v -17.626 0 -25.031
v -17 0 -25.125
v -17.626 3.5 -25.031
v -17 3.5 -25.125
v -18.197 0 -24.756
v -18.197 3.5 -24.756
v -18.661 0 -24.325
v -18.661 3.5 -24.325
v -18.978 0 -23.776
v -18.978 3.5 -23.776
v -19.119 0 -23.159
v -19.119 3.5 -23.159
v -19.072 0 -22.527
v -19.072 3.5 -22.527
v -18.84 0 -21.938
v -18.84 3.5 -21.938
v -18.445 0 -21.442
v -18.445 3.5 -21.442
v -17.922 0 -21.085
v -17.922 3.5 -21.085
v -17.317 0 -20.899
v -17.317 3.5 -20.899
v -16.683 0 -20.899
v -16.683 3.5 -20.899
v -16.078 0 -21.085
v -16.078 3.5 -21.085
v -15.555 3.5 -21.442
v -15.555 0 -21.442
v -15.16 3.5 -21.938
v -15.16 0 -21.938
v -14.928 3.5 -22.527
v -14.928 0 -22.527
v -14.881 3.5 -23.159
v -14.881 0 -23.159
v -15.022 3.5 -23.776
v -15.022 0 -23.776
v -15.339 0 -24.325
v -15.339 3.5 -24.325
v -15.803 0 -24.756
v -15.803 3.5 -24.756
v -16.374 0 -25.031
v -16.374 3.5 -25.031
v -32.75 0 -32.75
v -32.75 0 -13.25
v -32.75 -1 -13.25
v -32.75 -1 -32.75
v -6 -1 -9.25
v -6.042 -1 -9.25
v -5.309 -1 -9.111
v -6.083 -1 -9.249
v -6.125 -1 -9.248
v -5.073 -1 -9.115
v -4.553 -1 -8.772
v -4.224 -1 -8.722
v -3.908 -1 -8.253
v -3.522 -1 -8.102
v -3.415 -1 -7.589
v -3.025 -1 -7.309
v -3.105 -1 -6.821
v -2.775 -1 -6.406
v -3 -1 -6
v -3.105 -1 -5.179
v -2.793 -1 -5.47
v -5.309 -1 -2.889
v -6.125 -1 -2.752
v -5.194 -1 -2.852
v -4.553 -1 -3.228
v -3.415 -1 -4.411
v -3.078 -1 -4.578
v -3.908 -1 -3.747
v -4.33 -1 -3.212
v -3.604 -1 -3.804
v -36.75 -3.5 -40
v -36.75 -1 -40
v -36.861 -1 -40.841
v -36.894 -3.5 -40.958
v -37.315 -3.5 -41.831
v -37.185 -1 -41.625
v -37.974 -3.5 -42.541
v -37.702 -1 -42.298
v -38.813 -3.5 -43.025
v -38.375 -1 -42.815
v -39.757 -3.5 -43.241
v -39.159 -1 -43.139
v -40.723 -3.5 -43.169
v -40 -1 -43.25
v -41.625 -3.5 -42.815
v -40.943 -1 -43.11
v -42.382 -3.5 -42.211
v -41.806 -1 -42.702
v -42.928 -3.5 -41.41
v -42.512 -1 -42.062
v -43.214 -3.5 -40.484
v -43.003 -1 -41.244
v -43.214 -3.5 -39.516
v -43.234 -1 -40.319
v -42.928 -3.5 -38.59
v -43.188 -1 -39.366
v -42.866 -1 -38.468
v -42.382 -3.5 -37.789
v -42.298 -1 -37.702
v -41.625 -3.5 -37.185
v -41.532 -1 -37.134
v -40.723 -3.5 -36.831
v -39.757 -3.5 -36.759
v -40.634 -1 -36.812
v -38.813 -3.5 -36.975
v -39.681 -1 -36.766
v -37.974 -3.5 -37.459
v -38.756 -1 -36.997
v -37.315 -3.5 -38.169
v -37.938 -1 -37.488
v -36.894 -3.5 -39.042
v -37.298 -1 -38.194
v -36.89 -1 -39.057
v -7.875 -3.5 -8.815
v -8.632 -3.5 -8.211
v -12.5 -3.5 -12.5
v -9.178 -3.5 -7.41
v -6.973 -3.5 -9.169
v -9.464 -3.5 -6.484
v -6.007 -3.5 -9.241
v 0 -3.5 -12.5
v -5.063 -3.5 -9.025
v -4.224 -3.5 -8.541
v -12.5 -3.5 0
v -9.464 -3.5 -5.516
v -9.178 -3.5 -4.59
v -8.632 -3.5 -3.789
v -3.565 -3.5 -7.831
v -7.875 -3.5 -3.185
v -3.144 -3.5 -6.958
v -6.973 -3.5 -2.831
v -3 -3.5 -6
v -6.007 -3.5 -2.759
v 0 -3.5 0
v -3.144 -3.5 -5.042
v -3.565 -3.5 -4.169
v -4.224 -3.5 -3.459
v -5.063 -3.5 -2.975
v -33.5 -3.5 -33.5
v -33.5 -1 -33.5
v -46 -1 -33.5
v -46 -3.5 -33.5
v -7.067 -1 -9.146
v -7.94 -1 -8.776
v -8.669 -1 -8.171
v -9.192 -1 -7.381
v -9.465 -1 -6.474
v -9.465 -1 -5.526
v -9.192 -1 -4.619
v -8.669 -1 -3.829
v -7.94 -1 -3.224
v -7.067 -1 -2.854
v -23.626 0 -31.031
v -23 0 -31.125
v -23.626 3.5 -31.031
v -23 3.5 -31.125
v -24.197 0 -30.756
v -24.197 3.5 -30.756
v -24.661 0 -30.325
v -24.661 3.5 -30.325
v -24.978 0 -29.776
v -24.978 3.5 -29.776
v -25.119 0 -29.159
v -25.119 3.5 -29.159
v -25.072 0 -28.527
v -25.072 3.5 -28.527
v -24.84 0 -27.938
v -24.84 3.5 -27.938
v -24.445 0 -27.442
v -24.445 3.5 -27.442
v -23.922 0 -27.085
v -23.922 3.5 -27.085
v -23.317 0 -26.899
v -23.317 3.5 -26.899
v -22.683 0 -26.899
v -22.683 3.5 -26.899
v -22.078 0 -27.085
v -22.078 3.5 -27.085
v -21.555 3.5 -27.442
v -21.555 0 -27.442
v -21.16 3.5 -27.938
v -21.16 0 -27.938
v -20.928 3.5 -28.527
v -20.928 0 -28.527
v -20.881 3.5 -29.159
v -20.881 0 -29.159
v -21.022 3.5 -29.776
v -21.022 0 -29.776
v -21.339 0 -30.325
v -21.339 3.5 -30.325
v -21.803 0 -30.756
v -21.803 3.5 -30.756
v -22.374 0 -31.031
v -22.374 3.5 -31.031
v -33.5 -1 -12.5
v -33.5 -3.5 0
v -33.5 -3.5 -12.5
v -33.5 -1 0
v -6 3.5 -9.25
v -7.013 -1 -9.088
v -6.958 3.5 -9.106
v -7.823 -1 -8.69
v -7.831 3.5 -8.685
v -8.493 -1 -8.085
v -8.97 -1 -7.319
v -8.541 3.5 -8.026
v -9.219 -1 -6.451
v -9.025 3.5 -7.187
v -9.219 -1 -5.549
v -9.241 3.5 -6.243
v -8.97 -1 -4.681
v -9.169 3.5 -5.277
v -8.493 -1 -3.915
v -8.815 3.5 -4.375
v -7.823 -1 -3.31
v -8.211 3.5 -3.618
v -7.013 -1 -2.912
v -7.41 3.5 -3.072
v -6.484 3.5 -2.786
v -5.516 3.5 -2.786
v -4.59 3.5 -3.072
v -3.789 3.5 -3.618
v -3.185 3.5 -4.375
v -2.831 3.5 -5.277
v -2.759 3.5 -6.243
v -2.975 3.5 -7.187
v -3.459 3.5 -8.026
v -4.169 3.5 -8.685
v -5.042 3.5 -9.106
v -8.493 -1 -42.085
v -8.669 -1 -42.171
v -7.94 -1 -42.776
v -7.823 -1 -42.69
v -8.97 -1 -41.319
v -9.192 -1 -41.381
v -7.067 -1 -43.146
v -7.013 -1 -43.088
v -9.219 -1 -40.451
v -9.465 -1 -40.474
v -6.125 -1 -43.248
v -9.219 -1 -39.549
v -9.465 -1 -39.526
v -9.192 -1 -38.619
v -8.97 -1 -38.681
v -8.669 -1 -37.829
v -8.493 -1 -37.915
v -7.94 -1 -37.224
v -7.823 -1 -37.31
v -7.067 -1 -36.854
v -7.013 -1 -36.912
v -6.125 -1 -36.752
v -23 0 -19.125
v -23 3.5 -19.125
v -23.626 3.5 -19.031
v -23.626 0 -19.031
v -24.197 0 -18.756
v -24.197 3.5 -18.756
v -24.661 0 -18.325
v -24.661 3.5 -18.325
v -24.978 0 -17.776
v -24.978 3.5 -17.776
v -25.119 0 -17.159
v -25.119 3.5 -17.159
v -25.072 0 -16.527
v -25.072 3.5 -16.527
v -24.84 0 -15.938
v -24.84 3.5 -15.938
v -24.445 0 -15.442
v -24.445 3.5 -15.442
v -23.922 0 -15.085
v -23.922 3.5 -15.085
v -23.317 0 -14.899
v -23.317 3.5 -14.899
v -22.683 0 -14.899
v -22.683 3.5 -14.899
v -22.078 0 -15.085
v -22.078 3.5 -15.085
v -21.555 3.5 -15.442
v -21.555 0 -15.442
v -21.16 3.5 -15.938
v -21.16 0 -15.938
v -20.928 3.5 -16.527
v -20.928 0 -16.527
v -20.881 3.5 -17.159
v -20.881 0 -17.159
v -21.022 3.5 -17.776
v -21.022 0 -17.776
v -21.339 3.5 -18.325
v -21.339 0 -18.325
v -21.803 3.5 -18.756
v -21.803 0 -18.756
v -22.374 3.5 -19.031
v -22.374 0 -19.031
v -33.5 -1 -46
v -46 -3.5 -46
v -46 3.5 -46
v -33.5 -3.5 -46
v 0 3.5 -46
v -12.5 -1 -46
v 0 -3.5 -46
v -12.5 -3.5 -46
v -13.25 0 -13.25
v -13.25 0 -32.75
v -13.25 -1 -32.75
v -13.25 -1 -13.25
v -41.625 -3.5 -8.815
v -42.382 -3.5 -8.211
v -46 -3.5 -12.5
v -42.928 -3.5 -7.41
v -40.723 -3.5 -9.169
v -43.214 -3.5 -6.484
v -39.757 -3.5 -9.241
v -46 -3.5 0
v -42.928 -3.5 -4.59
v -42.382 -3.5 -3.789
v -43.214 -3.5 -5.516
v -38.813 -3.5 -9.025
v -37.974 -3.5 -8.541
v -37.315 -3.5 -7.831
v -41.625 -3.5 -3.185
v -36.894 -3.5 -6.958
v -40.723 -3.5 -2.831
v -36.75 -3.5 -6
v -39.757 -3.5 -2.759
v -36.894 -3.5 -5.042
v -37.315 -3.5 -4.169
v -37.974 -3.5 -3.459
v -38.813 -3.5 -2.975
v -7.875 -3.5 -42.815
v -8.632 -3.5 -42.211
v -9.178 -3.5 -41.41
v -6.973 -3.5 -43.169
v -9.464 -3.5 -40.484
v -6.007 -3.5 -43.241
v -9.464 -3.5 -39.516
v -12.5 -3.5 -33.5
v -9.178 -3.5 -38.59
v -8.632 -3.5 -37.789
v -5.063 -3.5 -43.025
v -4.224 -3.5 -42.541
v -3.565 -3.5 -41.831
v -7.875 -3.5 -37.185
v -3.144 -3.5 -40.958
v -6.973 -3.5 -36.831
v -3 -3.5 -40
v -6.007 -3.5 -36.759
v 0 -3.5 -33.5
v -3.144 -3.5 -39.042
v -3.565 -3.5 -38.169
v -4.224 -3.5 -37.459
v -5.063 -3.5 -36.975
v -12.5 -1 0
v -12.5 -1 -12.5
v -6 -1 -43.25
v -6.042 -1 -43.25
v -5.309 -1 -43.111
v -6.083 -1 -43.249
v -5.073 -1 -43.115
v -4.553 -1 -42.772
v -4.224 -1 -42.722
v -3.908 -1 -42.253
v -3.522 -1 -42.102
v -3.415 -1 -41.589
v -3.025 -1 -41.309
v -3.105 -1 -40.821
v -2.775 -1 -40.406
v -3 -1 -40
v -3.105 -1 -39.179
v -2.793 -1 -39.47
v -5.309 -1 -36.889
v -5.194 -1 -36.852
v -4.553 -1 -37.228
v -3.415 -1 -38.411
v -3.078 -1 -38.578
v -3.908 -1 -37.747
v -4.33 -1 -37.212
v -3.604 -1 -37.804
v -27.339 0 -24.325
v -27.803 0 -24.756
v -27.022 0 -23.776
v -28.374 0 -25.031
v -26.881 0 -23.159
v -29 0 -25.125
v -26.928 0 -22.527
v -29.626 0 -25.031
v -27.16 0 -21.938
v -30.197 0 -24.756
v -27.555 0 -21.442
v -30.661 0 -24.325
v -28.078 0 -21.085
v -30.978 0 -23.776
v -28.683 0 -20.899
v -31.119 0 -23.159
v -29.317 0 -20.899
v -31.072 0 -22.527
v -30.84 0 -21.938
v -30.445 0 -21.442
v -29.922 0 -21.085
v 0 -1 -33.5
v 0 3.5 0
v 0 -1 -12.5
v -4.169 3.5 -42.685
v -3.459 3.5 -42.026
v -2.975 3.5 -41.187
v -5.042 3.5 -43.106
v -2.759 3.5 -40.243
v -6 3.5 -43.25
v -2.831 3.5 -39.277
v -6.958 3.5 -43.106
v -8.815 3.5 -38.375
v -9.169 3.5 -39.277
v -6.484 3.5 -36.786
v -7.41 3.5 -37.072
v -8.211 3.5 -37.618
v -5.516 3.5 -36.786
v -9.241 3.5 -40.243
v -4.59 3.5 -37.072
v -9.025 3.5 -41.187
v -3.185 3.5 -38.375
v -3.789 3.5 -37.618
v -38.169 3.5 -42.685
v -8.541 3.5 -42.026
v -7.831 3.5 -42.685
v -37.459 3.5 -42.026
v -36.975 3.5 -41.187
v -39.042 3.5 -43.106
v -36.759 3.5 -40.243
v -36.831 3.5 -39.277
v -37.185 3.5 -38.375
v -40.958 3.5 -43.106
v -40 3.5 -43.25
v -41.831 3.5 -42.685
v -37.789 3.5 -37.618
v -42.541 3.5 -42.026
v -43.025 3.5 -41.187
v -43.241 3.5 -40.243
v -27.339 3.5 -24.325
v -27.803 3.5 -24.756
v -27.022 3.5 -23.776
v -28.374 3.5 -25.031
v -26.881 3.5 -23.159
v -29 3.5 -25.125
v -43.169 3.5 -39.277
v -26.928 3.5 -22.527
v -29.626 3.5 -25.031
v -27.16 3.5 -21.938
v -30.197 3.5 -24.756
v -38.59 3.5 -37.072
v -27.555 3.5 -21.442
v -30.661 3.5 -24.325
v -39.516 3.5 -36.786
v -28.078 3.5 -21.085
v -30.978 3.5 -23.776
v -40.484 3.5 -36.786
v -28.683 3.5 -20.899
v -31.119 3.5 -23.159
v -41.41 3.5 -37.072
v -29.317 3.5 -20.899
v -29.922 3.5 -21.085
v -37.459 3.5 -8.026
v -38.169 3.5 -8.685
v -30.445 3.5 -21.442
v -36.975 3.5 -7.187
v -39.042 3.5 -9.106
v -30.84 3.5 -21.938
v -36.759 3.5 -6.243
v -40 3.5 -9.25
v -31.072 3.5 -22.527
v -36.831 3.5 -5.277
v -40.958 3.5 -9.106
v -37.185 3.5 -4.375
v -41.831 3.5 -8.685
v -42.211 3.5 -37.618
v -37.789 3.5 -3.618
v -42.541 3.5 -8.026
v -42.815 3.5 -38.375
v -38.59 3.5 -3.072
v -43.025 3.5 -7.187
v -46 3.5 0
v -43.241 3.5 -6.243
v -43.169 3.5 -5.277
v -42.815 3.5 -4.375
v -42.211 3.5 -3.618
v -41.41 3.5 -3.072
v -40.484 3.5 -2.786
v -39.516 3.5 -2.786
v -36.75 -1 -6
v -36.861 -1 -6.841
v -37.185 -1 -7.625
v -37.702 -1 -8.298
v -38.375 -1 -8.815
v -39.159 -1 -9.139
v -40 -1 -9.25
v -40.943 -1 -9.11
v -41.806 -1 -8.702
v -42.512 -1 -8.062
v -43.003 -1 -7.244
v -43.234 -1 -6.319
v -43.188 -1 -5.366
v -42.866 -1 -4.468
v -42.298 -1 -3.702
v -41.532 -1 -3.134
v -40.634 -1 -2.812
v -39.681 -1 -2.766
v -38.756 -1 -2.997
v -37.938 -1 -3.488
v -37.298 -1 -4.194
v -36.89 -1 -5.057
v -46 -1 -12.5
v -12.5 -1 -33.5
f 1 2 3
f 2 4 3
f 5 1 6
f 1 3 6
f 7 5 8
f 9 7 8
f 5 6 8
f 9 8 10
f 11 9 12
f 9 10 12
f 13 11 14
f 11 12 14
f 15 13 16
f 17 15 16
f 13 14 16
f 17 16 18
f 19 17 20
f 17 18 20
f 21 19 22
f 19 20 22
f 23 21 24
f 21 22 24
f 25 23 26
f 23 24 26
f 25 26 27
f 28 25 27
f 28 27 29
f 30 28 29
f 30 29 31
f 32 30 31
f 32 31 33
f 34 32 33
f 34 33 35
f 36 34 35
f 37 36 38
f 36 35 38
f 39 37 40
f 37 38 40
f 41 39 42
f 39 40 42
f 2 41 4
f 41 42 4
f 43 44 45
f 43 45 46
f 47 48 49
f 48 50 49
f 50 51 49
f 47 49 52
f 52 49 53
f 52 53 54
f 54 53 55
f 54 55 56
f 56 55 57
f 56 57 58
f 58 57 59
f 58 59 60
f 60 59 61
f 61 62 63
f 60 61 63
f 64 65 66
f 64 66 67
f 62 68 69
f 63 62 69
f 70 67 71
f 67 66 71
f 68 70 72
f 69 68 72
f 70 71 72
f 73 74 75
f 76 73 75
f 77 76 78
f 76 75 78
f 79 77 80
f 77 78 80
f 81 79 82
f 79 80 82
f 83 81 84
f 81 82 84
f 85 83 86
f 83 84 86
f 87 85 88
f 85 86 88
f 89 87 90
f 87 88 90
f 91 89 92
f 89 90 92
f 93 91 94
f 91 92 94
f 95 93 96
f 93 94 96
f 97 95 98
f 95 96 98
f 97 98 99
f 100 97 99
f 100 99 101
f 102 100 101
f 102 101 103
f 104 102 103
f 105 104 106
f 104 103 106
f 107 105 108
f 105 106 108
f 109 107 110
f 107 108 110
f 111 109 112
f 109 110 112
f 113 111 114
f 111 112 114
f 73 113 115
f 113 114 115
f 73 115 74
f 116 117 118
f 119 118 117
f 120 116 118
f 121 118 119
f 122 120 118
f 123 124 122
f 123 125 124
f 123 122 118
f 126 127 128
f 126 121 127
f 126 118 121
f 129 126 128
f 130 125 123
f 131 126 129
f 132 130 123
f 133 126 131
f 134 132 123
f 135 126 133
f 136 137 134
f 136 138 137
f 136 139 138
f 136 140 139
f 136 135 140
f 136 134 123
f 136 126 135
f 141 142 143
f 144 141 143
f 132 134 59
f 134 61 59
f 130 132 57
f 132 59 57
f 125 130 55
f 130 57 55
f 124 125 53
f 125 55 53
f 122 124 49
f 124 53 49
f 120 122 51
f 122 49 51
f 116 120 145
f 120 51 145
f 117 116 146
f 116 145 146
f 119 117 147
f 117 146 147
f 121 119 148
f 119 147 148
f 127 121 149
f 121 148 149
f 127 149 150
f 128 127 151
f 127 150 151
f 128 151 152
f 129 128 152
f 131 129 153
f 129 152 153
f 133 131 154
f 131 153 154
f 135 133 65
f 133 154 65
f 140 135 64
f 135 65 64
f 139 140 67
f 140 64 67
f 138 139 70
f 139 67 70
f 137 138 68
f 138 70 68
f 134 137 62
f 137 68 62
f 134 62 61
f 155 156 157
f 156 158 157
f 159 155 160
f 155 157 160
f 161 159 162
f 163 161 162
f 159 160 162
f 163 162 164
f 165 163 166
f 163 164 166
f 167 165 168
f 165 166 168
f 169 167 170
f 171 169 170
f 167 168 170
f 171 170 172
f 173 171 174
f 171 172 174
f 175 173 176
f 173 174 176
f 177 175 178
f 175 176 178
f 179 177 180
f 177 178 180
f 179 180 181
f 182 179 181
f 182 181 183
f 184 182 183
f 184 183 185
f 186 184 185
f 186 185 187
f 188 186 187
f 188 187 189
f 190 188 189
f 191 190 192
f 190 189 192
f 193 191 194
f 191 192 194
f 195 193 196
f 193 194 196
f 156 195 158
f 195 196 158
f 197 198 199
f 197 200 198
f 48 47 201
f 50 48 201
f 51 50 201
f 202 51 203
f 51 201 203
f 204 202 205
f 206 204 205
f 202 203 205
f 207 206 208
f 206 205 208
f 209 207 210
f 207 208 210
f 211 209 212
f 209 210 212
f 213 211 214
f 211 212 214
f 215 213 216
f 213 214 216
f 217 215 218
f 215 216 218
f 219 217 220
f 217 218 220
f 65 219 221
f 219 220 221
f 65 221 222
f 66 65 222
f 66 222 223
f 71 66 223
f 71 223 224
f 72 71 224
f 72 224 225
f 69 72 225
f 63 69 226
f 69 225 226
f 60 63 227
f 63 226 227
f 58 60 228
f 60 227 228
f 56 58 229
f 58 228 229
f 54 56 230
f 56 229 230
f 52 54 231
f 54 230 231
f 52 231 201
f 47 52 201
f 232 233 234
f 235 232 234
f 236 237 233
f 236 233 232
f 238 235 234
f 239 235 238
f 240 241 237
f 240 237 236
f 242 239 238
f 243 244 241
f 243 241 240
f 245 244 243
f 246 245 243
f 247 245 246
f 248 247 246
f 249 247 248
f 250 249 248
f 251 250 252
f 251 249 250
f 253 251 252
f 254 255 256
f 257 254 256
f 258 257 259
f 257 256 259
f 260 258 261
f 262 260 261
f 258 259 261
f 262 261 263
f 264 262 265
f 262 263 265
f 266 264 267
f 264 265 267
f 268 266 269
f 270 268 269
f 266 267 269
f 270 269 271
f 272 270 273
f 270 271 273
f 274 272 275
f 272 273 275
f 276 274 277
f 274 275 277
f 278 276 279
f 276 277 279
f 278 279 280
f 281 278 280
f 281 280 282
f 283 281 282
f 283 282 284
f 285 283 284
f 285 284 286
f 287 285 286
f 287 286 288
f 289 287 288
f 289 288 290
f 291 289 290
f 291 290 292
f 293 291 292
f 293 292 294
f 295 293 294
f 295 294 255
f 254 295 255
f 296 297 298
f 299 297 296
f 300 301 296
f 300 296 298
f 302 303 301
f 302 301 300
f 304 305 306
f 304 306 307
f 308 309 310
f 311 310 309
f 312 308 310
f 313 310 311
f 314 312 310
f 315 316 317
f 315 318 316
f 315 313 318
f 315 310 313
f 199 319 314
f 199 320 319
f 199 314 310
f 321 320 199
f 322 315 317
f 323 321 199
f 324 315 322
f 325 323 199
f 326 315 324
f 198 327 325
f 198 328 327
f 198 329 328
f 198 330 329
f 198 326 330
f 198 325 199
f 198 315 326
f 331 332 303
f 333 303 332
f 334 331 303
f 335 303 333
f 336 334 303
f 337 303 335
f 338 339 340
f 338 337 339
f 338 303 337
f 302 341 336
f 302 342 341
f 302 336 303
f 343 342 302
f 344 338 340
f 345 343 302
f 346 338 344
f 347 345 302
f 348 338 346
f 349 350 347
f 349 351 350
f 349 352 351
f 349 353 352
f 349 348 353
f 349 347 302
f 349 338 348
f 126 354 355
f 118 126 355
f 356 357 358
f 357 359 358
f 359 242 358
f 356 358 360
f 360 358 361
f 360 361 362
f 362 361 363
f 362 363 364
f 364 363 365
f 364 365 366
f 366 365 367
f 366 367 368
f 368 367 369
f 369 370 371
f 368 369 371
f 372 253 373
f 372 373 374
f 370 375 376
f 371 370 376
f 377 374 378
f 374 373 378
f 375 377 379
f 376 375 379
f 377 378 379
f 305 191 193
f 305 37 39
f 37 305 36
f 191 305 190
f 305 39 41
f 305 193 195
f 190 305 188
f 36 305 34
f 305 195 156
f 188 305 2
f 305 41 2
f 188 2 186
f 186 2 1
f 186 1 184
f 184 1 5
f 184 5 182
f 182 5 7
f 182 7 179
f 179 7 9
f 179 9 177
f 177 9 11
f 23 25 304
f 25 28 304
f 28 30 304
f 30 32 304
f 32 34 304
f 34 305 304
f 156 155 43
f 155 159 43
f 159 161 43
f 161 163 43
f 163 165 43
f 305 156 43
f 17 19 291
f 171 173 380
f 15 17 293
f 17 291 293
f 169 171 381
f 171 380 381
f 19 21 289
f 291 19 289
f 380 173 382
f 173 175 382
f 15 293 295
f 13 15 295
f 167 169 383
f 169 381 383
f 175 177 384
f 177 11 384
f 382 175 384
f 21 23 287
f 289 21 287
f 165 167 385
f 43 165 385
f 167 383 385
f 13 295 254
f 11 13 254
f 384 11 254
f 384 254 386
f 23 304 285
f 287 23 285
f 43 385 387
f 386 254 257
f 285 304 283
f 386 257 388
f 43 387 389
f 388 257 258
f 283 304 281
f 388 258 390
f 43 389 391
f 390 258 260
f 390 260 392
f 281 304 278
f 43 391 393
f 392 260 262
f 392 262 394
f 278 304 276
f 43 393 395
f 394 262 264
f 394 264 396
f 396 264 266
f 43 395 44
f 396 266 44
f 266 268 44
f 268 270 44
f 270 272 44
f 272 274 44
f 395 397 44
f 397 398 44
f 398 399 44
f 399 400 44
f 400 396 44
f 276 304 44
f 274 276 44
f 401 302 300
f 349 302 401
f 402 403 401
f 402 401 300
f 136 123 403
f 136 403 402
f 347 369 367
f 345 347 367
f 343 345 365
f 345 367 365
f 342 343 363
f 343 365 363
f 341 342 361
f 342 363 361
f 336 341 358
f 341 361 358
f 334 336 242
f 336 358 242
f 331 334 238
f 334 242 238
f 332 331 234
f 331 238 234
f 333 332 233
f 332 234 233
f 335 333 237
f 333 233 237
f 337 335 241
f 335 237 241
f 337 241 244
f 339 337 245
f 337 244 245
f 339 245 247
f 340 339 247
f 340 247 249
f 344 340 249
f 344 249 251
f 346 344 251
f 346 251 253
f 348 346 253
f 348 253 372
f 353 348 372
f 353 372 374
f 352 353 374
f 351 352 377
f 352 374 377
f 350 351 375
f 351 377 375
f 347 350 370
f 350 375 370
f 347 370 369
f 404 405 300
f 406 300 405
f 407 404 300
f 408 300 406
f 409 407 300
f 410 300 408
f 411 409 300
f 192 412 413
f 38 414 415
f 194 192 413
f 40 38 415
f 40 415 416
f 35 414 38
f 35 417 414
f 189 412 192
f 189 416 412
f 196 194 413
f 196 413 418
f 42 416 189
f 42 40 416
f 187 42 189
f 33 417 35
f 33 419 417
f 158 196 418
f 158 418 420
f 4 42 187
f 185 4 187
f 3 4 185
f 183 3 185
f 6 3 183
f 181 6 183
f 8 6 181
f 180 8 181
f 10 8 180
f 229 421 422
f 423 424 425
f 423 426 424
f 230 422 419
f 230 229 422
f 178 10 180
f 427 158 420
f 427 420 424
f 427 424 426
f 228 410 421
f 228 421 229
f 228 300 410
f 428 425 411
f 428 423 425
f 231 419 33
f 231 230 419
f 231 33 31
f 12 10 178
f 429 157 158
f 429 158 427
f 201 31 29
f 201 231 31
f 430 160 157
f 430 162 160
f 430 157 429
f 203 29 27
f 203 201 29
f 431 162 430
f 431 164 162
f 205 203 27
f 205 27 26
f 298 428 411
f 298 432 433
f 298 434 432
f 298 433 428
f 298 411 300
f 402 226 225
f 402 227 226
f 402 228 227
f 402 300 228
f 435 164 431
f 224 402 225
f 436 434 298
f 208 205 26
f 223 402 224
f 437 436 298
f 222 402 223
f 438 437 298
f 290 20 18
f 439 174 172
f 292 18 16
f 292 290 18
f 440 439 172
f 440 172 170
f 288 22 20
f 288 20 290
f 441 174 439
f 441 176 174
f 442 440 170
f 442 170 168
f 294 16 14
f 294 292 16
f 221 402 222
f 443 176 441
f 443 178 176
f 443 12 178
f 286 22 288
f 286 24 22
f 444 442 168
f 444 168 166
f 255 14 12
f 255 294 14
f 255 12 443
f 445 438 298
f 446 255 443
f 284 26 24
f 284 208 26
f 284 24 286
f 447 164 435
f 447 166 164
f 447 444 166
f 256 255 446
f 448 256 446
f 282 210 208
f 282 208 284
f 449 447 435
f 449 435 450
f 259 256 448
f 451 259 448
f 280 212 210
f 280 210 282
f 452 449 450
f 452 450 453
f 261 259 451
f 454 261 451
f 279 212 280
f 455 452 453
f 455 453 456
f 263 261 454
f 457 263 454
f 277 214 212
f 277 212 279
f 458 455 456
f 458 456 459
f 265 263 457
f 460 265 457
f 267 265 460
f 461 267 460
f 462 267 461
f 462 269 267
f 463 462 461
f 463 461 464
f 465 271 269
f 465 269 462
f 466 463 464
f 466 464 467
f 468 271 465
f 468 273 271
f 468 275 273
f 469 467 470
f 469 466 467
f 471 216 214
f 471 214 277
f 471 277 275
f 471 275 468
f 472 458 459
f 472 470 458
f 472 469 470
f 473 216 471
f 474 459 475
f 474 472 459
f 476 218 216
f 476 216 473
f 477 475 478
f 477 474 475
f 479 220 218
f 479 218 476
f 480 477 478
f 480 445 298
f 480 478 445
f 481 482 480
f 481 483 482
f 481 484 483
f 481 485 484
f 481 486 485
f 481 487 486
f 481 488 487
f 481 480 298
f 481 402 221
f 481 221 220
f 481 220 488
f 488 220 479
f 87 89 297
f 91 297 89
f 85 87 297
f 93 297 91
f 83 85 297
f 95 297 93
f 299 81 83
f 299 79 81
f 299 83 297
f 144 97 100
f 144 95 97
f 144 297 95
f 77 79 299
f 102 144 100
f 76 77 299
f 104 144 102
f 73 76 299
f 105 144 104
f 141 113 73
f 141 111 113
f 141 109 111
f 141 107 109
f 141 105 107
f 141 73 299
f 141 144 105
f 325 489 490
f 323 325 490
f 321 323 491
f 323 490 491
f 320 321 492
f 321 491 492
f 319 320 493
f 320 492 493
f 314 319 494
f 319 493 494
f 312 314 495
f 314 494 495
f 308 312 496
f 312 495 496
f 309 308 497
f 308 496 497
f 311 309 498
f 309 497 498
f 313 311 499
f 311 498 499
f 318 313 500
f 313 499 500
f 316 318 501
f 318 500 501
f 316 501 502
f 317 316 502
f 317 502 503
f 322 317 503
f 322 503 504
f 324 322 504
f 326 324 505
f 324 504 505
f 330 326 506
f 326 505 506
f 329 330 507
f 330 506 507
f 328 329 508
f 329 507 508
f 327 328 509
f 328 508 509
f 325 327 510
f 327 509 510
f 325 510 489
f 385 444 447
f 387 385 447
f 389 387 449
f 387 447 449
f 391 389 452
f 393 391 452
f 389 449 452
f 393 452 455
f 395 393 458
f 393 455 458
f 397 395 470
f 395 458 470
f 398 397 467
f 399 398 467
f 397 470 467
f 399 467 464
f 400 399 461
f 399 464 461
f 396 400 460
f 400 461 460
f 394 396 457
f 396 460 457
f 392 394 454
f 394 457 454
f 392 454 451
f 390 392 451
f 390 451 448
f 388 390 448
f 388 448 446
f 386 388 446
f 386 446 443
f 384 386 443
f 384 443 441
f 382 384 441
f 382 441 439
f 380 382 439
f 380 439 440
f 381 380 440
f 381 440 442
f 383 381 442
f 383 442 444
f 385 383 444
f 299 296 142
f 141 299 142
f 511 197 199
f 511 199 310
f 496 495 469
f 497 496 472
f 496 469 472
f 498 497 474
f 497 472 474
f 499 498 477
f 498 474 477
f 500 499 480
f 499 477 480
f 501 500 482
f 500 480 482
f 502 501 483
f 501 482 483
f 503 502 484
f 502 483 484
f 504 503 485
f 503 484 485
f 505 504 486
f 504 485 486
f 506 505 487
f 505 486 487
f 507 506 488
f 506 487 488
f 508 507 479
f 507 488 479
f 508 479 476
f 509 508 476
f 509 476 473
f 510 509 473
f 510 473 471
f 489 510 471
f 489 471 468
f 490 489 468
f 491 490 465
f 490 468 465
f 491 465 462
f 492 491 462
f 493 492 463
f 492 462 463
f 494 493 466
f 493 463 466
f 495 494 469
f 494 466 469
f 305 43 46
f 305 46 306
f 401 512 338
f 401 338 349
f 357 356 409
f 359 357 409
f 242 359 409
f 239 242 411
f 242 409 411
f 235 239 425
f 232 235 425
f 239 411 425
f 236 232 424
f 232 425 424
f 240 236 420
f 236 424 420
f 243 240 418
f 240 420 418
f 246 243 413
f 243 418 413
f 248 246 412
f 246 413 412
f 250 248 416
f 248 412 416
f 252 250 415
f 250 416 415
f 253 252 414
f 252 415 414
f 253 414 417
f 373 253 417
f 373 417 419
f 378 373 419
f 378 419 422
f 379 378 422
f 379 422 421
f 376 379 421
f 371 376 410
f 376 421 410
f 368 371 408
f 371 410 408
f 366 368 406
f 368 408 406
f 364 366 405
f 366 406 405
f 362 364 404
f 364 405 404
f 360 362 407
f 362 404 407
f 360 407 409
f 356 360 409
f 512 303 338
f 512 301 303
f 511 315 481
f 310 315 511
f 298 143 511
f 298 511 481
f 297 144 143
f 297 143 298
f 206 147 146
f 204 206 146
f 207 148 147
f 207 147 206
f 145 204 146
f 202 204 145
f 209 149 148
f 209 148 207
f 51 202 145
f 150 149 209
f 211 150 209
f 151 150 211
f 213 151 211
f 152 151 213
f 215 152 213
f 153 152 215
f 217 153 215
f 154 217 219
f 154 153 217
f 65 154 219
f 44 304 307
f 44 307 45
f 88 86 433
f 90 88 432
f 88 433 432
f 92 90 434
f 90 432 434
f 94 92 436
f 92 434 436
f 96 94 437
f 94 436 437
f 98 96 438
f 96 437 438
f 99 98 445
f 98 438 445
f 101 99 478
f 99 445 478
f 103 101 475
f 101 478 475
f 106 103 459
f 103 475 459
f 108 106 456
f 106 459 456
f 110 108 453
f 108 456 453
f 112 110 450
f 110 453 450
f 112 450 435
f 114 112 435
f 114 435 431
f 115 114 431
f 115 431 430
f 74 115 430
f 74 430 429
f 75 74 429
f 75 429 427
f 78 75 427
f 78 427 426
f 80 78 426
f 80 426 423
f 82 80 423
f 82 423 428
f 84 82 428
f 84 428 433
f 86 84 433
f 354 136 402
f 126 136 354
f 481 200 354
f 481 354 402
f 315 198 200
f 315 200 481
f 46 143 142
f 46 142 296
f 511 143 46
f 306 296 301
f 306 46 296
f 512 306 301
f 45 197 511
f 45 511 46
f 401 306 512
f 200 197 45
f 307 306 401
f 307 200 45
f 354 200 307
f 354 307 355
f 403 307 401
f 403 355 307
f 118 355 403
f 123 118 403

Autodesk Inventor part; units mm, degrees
ref_plane "YZ Plane" through (0, 0, 0) normal (1, 0, 0) x (0, 1, 0)
ref_plane "XZ Plane" through (0, 0, 0) normal (0, 1, 0) x (-1, 0, 0)
ref_plane "XY Plane" through (0, 0, 0) normal (0, 0, 1) x (1, 0, 0)
sketch "Sketch2" plane through (0, 0, 0) normal (0, 1, 0) x (-1, 0, 0)
  line L0 (0, 0) -> (46, 0)
  line L1 (46, 0) -> (46, -46)
  line L2 (46, -46) -> (0, -46)
  line L3 (0, -46) -> (0, 0)
  dimension "d0" = 46
  dimension "d1" = 46
extrude "Extrusion1" add sketch "Sketch2" along normal blind 3.5
sketch "Sketch6" plane through (0, 0, 0) normal (0, -1, 0) x (1, 0, 0)
  line L0 (-13.25, -13.25) -> (-32.75, -13.25)
  line L1 (-32.75, -13.25) -> (-32.75, -32.75)
  line L2 (-32.75, -32.75) -> (-13.25, -32.75)
  line L3 (-13.25, -32.75) -> (-13.25, -13.25)
  line L4 (-46, -46) -> (0, -46) projected
  line L5 (0, 0) -> (0, -46) projected
  line L6 (-46, -46) -> (-46, 0) projected
  line L7 (0, 0) -> (-46, 0)
  line L8 (-46, 0) -> (-46, -46)
  line L9 (-46, -46) -> (0, -46)
  line L10 (0, -46) -> (0, 0)
  dimension "d41" = 13.25
  dimension "d42" = 13.25
  dimension "d43" = 13.25
  dimension "d44" = 13.25
extrude "Extrusion3" add sketch "Sketch6" along normal blind 1
sketch "Sketch7" plane through (0, -1, 0) normal (0, -1, 0) x (1, 0, 0)
  circle A0 centre (-6, -40) radius 3.25
  line L0 (-46, -46) -> (0, -46) projected
  line L1 (0, -46) -> (0, 0) projected
  circle A1 centre (-40, -40) radius 3.25
  line L2 (-46, 0) -> (-46, -46) projected
  circle A2 centre (-40, -6) radius 3.25
  line L3 (0, 0) -> (-46, 0) projected
  circle A3 centre (-6, -6) radius 3.25
  dimension "d26" = 6.5
  dimension "d27" = 6
  dimension "d28" = 6
  dimension "d29" = 6.5
  dimension "d30" = 6
  dimension "d31" = 6.5
  dimension "d32" = 6
  dimension "d33" = 6.5
  dimension "d45" = 6
  dimension "d46" = 6
  dimension "d47" = 6
  dimension "d48" = 6
hole "Hole2" at (-6, -1, -6) at (-6, -1, -40) at (-40, -1, -40) at (-40, -1, -6) direction (0, 1, 0) diameter 6.5 depth 9
sketch "Sketch8" plane through (0, 0, 0) normal (0, -1, 0) x (1, 0, 0)
  line L0 (-32.75, -13.25) -> (-13.25, -13.25) projected
  line L1 (-23, -13.25) -> (-23, -32.75)
  line L2 (-32.75, -32.75) -> (-13.25, -32.75) projected
  line L3 (-23, -23) -> (-11, -23)
  circle A0 centre (-17, -23) radius 2.125
  circle A1 centre (-23, -17) radius 2.125
  circle A2 centre (-23, -29) radius 2.125
  circle A3 centre (-29, -23) radius 2.125
  point P0 (0, 0)
  dimension "d49" = 4.25
  dimension "d50" = 6
  dimension "d51" = 4.25
  dimension "d52" = 6
  dimension "d53" = 4.25
  dimension "d54" = 6
  dimension "d55" = 4.25
  dimension "d56" = 6
hole "Hole3" at (-29, 0, -23) at (-23, 0, -17) at (-23, 0, -29) at (-17, 0, -23) direction (0, 1, 0) diameter 4.25 end through all
sketch "Sketch9" plane through (0, -1, 0) normal (0, -1, 0) x (1, 0, 0)
  line L0 (0, 0) -> (-46, 0) projected
  line L1 (0, 0) -> (-12.5, 0)
  line L2 (-12.5, 0) -> (-12.5, -12.5)
  line L3 (-12.5, -12.5) -> (0, -12.5)
  line L4 (0, -12.5) -> (0, 0)
  line L5 (-46, -46) -> (0, -46) projected
  line L6 (0, -46) -> (-12.5, -46)
  line L7 (-12.5, -46) -> (-12.5, -33.5)
  line L8 (-12.5, -33.5) -> (0, -33.5)
  line L9 (0, -33.5) -> (0, -46)
  line L10 (-46, -46) -> (-33.5, -46)
  line L11 (-33.5, -46) -> (-33.5, -33.5)
  line L12 (-33.5, -33.5) -> (-46, -33.5)
  line L13 (-46, -33.5) -> (-46, -46)
  circle A0 centre (-40, -40) radius 3.25 projected
  circle A1 centre (-40, -40) radius 3.25
  circle A2 centre (-40, -6) radius 3.25 projected
  circle A3 centre (-40, -6) radius 3.25
  circle A4 centre (-6.25, -40) radius 3.25
  circle A5 centre (-6.25, -6) radius 3.25
  line L14 (-46, 0) -> (-33.5, 0)
  line L15 (-33.5, 0) -> (-33.5, -12.5)
  line L16 (-33.5, -12.5) -> (-46, -12.5)
  line L17 (-46, -12.5) -> (-46, 0)
  dimension "d66" = 12.5
  dimension "d67" = 12.5
  dimension "d68" = 12.5
  dimension "d69" = 12.5
  dimension "d70" = 12.5
  dimension "d71" = 12.5
  dimension "d72" = 6.5
  dimension "d73" = 6.5
  dimension "d74" = 6.5
  dimension "d77" = 12.5
  dimension "d78" = 12.5
extrude "Extrusion4" add sketch "Sketch9" along normal blind 2.5
properties part number "RotatorBottom"
